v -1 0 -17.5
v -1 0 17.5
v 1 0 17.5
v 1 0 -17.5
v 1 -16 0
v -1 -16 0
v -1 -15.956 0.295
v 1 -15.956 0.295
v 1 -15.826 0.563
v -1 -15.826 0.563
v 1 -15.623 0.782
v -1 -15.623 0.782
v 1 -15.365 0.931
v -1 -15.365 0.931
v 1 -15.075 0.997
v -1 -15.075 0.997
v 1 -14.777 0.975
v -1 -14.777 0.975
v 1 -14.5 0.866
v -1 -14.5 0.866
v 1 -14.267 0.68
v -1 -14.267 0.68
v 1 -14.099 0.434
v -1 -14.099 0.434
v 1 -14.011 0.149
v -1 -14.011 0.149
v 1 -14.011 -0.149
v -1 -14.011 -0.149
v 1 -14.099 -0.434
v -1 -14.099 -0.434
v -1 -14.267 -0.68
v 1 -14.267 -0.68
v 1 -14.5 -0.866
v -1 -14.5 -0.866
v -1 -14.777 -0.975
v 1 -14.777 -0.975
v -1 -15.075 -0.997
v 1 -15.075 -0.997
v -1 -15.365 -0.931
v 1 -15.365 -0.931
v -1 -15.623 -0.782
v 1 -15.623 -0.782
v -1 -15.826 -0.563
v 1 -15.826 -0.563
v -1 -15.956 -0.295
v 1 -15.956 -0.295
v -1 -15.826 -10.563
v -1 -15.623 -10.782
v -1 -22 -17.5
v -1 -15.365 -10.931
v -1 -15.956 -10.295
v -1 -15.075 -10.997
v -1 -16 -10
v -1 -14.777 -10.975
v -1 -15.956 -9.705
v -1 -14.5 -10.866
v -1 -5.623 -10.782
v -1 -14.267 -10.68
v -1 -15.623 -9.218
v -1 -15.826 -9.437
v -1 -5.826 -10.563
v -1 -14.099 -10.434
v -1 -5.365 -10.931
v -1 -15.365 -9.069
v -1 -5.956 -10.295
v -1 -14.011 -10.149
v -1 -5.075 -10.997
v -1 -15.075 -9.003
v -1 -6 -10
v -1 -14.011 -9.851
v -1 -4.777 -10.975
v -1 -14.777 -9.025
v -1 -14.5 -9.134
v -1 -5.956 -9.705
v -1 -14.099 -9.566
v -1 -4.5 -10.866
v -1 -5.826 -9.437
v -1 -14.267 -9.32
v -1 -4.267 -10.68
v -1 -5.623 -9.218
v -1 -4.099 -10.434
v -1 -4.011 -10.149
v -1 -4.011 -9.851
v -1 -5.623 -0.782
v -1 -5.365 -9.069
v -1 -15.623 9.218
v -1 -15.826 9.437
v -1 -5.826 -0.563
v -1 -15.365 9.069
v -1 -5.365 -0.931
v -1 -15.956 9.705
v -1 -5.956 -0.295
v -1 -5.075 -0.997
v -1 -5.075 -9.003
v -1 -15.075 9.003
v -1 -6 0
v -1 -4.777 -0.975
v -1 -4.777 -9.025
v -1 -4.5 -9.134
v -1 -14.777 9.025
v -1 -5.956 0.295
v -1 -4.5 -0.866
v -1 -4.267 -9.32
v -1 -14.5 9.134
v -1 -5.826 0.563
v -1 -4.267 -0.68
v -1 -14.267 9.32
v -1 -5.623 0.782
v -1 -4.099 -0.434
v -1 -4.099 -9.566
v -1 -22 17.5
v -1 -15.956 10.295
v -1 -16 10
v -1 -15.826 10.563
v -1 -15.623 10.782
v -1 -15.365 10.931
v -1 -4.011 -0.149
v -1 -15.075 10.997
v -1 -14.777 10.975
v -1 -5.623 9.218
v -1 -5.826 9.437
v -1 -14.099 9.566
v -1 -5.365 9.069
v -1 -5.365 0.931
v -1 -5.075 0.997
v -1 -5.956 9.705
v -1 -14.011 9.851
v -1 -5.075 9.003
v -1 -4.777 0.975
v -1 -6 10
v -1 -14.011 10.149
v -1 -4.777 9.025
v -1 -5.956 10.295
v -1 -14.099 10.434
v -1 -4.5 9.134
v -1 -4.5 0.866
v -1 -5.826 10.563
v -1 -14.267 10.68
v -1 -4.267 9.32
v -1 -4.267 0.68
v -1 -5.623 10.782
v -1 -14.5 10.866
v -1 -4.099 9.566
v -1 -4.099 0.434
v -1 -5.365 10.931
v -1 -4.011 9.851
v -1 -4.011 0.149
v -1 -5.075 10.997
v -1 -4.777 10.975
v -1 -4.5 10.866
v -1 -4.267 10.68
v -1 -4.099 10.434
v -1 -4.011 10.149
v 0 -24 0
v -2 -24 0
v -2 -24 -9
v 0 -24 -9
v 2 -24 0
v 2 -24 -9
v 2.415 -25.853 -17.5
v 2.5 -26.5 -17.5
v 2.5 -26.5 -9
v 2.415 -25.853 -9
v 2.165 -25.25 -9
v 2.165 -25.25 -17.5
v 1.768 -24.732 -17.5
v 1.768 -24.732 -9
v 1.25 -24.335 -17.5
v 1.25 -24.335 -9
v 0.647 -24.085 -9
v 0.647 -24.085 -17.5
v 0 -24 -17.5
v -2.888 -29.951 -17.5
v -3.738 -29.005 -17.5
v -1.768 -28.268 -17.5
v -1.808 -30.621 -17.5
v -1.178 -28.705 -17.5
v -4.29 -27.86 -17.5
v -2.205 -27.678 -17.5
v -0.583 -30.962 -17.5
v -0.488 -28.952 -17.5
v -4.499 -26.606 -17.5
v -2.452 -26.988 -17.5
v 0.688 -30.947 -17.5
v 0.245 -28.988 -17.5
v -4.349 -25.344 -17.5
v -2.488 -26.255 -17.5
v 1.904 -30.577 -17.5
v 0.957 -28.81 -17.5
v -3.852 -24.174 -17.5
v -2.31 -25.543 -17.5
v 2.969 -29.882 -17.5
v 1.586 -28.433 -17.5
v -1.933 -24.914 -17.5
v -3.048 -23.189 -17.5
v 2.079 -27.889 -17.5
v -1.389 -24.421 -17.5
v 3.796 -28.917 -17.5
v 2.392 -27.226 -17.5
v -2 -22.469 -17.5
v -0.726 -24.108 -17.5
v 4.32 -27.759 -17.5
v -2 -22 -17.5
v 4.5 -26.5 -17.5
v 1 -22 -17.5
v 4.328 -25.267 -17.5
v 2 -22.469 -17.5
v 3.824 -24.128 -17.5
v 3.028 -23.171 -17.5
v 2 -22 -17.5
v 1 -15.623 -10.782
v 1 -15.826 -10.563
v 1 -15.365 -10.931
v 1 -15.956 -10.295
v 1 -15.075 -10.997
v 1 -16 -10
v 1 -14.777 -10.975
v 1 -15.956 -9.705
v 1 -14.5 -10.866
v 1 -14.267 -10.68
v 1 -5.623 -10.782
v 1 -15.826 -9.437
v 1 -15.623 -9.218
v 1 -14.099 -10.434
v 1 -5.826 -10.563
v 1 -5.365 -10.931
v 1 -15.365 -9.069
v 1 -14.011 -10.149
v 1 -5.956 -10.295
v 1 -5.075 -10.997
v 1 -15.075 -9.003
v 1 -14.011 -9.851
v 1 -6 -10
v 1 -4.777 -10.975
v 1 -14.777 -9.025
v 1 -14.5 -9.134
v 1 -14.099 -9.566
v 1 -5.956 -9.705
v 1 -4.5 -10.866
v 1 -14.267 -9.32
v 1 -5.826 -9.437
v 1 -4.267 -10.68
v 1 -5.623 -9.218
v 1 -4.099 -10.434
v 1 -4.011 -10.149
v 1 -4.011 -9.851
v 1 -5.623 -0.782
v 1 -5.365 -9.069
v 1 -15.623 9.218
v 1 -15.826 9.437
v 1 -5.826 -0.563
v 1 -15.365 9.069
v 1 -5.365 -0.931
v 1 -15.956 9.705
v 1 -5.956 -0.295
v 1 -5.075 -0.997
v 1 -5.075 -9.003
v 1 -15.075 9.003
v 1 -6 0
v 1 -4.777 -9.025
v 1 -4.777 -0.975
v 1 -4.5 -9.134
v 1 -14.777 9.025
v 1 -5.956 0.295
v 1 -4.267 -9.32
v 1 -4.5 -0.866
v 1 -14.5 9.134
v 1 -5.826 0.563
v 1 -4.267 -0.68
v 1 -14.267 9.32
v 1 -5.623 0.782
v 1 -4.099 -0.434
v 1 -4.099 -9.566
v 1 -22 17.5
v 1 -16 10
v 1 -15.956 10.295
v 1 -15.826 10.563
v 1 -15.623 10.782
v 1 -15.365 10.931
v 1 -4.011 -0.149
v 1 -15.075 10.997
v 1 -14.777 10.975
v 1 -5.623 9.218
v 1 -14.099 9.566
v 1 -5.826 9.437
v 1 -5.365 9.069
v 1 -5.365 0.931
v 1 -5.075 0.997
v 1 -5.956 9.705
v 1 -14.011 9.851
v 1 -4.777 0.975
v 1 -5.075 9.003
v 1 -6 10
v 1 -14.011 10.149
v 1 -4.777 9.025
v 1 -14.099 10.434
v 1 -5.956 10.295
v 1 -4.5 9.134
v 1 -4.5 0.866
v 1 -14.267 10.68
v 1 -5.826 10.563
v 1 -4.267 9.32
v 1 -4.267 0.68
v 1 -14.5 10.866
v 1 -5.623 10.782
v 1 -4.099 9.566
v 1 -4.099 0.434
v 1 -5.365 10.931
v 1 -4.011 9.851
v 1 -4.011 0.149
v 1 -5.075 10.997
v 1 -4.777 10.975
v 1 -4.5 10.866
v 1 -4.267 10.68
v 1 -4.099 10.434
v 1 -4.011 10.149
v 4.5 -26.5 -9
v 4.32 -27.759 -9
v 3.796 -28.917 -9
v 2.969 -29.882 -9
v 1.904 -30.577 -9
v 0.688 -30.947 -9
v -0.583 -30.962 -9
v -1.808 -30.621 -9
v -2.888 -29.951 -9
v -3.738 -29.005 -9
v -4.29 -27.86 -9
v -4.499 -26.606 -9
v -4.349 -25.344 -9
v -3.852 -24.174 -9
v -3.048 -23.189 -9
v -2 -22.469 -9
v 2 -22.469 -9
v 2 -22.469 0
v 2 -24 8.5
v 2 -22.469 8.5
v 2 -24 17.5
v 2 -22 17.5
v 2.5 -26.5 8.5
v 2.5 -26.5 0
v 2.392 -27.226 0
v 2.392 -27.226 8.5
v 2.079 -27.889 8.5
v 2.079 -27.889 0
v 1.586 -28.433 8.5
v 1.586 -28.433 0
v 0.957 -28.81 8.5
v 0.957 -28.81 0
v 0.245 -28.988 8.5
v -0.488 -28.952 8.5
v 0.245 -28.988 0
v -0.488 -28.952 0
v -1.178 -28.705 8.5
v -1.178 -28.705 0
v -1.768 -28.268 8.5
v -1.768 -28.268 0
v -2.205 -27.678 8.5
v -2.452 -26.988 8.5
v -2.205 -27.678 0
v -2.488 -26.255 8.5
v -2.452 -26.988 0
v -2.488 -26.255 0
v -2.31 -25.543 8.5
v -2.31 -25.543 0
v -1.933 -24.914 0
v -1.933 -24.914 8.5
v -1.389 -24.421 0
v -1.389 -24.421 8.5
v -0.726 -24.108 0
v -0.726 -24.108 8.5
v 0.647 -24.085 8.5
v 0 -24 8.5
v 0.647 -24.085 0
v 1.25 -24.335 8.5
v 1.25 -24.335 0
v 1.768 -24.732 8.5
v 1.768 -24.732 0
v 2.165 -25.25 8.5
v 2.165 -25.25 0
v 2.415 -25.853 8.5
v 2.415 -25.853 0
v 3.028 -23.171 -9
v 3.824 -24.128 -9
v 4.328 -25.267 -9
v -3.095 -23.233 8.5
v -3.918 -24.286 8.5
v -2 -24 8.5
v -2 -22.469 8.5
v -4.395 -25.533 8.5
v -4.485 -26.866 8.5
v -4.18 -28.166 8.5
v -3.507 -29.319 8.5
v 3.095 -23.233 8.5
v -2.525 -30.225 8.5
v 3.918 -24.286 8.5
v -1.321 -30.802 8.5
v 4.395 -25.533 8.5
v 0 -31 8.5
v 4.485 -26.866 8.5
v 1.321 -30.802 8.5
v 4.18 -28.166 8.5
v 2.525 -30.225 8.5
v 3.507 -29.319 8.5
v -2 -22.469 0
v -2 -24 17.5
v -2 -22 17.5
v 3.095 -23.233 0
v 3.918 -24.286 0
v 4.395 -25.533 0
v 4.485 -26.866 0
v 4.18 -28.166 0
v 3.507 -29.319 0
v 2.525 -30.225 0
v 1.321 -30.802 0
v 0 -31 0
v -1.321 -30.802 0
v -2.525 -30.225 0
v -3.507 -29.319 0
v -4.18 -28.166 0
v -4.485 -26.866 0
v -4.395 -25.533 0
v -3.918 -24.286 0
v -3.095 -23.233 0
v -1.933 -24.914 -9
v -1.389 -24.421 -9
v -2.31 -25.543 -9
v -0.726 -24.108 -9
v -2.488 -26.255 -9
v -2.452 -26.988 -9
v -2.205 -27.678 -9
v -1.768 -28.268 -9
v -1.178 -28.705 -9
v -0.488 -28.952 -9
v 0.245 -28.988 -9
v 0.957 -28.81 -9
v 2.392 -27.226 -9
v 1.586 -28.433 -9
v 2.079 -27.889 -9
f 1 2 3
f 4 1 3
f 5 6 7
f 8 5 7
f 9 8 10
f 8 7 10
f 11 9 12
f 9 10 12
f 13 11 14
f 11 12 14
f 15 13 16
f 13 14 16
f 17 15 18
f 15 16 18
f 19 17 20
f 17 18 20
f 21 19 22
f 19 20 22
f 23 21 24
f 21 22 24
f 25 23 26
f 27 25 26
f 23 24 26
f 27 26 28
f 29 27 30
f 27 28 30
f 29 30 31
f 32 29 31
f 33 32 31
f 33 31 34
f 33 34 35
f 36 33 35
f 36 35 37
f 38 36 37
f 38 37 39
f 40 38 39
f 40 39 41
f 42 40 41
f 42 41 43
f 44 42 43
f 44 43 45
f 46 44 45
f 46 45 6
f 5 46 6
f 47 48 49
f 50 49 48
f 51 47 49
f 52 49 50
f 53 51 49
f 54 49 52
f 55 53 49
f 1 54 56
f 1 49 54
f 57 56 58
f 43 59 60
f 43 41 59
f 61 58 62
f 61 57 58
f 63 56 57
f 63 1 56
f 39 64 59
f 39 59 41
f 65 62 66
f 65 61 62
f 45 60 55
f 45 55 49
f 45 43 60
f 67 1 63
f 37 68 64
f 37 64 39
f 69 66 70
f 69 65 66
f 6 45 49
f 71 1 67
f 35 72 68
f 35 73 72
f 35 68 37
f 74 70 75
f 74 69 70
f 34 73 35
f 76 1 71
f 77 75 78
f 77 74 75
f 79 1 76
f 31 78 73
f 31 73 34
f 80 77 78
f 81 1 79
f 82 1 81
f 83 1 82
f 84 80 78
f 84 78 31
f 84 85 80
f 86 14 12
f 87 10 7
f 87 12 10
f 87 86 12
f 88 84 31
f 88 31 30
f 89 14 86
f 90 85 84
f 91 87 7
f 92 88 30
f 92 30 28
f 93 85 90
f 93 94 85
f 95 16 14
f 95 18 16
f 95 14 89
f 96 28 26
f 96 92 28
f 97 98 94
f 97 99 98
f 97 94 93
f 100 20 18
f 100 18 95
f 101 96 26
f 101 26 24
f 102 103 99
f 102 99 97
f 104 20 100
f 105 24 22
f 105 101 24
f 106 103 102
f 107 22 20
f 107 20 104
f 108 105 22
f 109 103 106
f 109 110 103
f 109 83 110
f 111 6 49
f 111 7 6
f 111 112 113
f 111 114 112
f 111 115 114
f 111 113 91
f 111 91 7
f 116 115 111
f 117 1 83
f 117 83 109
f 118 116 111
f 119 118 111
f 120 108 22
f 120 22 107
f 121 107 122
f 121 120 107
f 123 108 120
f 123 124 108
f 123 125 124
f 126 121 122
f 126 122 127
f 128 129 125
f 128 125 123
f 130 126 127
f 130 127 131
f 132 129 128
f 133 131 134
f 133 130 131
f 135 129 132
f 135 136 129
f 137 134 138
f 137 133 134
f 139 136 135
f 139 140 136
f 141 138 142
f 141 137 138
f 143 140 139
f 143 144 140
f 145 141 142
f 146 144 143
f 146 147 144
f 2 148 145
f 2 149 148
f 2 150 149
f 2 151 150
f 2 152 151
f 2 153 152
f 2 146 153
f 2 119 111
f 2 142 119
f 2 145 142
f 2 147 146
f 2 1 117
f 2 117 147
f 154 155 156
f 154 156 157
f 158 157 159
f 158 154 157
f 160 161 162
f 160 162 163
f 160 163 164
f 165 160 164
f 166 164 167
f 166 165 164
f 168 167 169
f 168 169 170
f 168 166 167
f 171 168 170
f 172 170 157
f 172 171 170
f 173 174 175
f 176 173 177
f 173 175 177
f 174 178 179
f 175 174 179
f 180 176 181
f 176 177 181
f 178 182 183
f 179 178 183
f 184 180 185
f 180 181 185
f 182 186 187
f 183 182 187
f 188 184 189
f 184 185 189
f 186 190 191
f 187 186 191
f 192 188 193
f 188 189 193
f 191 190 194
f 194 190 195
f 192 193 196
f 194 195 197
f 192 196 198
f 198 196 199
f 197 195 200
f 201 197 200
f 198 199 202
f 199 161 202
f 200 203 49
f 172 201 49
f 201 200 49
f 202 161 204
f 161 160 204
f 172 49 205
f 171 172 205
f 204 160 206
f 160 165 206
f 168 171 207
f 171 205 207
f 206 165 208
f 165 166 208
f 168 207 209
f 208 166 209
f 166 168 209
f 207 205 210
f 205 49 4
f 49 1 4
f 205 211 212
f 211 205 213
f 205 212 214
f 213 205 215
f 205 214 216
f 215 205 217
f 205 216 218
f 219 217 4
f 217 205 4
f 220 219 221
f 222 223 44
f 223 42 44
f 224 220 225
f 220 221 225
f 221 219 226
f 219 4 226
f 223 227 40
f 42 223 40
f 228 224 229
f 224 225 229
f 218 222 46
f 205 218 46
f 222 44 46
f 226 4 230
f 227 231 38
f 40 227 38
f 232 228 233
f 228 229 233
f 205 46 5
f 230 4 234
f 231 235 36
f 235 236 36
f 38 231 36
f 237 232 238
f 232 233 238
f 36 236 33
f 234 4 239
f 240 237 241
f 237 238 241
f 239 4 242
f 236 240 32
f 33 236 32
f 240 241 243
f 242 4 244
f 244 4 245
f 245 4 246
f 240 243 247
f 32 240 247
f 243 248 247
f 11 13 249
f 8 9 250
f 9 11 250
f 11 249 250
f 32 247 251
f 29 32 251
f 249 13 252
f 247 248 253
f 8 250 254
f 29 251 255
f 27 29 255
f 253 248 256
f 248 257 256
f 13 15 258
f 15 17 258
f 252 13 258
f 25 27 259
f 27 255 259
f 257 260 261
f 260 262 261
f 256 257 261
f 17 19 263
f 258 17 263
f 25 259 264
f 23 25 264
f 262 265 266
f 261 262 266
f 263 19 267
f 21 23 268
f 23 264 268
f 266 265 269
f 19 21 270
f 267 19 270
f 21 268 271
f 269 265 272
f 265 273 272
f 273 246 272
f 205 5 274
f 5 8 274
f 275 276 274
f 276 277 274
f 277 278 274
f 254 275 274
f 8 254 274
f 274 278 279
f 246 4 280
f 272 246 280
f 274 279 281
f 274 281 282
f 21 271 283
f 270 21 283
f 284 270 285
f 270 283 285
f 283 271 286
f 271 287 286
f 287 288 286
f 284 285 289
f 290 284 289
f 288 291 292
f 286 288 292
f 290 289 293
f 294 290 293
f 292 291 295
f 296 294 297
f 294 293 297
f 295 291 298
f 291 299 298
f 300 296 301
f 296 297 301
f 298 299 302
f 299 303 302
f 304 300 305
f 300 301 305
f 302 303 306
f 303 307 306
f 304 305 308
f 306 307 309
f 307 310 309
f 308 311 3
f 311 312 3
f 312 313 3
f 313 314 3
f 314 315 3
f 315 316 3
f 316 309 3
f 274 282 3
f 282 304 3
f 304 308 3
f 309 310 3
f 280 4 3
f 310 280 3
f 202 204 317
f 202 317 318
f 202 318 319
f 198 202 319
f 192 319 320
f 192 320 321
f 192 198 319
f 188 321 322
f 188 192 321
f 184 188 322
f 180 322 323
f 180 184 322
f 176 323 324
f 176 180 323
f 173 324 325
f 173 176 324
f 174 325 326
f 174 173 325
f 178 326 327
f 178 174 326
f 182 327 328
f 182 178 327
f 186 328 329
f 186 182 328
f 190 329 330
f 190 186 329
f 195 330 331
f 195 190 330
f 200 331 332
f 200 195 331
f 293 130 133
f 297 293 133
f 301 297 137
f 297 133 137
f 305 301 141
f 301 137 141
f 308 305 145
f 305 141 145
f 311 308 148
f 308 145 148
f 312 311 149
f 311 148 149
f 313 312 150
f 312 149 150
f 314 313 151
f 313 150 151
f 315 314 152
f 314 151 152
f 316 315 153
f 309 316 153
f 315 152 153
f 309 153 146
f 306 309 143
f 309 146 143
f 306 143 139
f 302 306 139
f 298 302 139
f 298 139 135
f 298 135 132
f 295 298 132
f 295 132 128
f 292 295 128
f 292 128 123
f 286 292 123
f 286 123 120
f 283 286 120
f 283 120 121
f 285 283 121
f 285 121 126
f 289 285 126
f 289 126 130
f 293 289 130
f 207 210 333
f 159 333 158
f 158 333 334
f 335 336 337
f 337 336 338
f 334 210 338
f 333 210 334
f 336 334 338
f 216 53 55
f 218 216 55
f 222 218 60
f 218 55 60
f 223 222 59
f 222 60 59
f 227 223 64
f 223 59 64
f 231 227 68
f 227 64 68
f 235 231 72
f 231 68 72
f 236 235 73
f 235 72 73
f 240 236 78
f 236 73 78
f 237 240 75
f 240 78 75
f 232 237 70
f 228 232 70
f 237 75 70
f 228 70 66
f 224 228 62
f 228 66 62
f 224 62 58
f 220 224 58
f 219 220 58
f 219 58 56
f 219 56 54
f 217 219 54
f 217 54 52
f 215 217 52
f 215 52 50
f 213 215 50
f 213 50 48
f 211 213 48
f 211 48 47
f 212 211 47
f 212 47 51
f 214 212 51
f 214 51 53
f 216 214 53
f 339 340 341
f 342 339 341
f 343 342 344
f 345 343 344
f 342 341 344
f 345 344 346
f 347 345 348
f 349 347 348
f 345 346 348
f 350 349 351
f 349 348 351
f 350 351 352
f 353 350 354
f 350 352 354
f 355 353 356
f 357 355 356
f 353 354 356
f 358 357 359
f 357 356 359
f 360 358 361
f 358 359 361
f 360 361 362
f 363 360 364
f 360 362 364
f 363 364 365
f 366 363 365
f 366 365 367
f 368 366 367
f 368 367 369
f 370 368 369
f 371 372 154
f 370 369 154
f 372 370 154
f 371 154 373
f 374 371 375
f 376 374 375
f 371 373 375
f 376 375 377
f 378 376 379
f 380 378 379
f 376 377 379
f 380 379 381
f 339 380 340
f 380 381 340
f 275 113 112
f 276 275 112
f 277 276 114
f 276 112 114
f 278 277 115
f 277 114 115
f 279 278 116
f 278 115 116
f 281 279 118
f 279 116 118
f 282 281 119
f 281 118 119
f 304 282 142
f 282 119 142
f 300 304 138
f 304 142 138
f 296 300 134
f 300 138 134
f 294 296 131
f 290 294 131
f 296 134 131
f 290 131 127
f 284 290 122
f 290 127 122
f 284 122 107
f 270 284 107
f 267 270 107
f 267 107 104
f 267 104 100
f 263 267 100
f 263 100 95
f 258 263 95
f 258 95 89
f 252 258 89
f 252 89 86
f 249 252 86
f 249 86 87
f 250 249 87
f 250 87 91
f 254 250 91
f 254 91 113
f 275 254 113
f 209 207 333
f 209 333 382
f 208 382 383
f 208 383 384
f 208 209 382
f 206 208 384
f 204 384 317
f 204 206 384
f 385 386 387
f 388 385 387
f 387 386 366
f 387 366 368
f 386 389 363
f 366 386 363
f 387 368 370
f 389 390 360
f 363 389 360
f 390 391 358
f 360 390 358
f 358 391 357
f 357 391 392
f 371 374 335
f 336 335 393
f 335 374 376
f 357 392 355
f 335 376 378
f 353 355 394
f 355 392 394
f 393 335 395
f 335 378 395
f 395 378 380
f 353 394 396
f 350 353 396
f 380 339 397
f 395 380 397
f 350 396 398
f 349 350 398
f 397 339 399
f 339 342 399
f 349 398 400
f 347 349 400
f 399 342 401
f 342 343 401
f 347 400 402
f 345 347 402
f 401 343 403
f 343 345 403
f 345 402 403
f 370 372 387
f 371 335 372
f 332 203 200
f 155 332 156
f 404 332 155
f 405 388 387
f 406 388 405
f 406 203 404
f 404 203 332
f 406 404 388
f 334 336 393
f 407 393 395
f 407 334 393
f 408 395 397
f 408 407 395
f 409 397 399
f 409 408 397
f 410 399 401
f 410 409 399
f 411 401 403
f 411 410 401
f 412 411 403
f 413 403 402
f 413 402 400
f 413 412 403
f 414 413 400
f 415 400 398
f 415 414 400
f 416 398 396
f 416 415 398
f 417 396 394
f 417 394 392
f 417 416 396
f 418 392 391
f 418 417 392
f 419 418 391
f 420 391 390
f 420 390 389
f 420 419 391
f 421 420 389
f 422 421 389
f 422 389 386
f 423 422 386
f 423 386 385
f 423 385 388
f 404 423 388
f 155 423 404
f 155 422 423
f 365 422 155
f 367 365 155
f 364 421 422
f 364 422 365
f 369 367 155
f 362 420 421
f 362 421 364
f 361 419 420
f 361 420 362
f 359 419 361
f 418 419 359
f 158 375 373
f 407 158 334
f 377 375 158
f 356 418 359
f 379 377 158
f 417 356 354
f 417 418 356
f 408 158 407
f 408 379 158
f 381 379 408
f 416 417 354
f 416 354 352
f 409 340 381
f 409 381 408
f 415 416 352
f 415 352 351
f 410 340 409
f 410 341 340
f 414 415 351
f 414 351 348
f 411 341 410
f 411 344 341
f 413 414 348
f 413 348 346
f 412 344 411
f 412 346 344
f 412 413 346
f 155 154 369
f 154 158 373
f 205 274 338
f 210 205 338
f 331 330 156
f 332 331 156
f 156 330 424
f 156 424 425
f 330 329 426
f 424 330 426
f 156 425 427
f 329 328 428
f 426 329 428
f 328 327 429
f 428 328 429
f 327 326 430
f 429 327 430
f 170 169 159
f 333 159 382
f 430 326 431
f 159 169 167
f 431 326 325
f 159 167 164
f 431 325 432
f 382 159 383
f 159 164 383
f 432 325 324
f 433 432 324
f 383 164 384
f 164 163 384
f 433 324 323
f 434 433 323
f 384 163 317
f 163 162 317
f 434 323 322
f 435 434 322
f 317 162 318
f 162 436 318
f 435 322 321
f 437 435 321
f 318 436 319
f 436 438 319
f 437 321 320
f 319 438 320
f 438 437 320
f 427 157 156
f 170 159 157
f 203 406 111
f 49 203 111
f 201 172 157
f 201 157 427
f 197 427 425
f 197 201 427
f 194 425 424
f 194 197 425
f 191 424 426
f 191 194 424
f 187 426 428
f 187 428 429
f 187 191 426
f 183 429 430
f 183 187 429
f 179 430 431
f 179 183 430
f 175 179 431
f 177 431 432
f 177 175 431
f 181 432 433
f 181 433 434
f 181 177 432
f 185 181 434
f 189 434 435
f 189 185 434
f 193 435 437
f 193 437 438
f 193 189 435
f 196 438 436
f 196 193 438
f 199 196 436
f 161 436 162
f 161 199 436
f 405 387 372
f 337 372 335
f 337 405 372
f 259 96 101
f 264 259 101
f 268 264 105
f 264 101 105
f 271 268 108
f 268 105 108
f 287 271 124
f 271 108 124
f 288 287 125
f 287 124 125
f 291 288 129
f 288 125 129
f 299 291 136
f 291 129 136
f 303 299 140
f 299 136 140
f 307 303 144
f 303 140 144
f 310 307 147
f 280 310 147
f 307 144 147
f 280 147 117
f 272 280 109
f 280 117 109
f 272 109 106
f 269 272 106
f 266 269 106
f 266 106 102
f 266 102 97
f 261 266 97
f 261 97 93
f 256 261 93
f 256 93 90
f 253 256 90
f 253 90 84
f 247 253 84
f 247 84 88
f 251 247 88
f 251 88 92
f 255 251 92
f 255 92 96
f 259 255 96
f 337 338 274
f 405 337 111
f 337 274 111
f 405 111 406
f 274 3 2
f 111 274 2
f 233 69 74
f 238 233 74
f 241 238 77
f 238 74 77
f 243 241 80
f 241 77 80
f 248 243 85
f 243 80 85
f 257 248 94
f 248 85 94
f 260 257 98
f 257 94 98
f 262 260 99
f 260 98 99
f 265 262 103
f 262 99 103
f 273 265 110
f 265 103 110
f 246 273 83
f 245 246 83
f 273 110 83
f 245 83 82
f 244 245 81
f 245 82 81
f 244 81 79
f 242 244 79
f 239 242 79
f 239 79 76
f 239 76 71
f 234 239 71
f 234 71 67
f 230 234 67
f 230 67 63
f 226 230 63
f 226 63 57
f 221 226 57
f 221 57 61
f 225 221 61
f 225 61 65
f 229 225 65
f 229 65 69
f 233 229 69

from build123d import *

# Parameters (mm, degrees)
F0_W     = 2
F0_H     = 35
F1_DEPTH = 22
F2_R     = 1
F3_DEPTH = 25
F4_W     = 1
F4_H     = 35
F4_W_2   = 2
F5_DEPTH = 2
F8_R     = 4.5
F8_R_2   = 2.5
F9_DEPTH = 8.5


# Not quite as in the source:
# - a feature names something its author has since deleted; it is built from what else it names


with BuildPart() as f1:
    # F0 (on Front) → F1 (new body)
    with BuildSketch(Plane.XZ):
        Rectangle(F0_W, F0_H)
    extrude(amount=F1_DEPTH)

    # F2 (on face) → F3 (cut)
    with BuildSketch(Plane(origin=(-1, 0, 0), x_dir=(0, -1, 0), z_dir=(-1, 0, 0))):
        with Locations((5, 10)):
            Circle(F2_R)
        with Locations((15, 10)):
            Circle(F2_R)
        with Locations((15, 0)):
            Circle(F2_R)
        with Locations((5, 0)):
            Circle(F2_R)
        with Locations((5, -10)):
            Circle(F2_R)
        with Locations((15, -10)):
            Circle(F2_R)
    extrude(amount=-F3_DEPTH, mode=Mode.SUBTRACT)

    # F4 (on face) → F5 (join)
    with BuildSketch(Plane.XZ.offset(22)):
        with Locations((-1.5, 0)):
            Rectangle(F4_W, F4_H)
        with Locations((1.5, 0)):
            Rectangle(F4_W, F4_H)
        Rectangle(F4_W_2, F4_H)
    extrude(amount=F5_DEPTH)

    # F8 (on offset) + F6 (on face) → F9 (join)
    with BuildSketch(Plane(origin=(0, 0, 0), x_dir=(1, 0, 0), z_dir=(0, 0, -1))):
        with Locations((0, 26.5)):
            Circle(F8_R)
        with Locations((0, 26.5)):
            Circle(F8_R_2, mode=Mode.SUBTRACT)
    with BuildSketch(Plane(origin=(0, 0, -17.5), x_dir=(1, 0, 0), z_dir=(0, 0, -1))):
        with BuildLine():
            Line((-2, 24), (0, 24))
            Line((0, 24), (2, 24))
            Line((2, 24), (2, 22.4688711259))
            ThreePointArc((2, 22.4688711259), (3.8242646352, 24.1282917549), (4.5, 26.5))
            ThreePointArc((4.5, 26.5), (-2.3717082451, 30.3242646352), (-2, 22.4688711259))
            Line((-2, 22.4688711259), (-2, 24))
        make_face()
        with BuildLine():
            ThreePointArc((0, 24), (-1.767766953, 28.267766953), (2.5, 26.5))
            ThreePointArc((2.5, 26.5), (1.767766953, 24.732233047), (0, 24))
        make_face(mode=Mode.SUBTRACT)
    extrude(amount=-F9_DEPTH)


solid = f1.part
